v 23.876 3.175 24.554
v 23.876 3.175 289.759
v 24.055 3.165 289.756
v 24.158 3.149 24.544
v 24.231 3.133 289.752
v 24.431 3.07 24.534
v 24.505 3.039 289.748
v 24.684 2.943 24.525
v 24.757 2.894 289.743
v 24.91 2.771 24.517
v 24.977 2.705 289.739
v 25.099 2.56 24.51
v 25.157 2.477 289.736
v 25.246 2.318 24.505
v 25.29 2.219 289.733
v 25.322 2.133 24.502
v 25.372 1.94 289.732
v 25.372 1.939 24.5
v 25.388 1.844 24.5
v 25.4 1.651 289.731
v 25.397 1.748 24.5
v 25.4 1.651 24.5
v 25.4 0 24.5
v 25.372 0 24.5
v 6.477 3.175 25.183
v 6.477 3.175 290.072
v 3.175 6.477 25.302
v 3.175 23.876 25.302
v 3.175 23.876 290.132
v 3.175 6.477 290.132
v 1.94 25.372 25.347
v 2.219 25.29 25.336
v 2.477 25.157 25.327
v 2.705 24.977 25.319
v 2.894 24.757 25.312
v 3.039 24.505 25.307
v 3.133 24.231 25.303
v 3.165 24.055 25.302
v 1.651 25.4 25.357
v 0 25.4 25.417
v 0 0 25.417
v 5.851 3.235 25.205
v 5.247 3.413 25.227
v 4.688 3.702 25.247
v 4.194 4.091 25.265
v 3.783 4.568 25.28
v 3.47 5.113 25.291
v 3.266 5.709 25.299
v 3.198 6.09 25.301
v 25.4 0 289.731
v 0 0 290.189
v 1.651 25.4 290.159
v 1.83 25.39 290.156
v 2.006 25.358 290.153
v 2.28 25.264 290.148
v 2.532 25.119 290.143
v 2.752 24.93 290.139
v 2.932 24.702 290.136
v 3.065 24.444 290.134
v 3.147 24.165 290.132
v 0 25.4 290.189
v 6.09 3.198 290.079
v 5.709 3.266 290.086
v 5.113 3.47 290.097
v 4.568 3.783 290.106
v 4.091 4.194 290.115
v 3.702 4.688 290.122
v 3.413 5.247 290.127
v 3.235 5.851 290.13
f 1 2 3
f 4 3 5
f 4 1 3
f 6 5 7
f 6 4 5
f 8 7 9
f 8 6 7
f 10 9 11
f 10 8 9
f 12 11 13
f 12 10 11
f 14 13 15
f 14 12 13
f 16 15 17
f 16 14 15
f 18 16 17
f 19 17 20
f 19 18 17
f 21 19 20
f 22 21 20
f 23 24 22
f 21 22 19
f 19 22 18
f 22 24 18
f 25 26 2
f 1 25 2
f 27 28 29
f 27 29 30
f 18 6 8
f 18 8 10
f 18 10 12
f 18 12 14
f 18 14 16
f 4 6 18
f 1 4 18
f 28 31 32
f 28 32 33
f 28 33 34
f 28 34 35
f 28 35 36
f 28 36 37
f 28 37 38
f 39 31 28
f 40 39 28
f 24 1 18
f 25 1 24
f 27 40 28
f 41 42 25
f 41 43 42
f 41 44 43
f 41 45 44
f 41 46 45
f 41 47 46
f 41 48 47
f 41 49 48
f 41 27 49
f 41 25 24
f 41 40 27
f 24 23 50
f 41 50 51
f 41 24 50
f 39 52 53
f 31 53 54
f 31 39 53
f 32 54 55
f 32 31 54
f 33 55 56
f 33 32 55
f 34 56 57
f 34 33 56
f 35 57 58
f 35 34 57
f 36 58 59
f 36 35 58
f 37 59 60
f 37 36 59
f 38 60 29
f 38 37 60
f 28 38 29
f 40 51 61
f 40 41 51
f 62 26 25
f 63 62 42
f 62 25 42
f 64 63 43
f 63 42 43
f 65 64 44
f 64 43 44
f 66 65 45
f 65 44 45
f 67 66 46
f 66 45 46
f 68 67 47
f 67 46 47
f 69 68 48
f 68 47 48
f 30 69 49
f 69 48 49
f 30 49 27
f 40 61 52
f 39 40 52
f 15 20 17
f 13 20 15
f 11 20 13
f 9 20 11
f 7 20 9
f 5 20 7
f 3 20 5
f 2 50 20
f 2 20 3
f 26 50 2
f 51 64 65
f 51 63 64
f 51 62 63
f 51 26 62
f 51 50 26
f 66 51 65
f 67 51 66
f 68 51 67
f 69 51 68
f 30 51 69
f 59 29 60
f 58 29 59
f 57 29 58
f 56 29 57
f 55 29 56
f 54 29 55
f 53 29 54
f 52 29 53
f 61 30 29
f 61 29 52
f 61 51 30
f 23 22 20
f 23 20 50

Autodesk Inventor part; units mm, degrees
ref_plane "Start Plane" through (0, 0, 24.5) normal (0, 0, 1) x (1, 0, 0)
ref_plane "End Plane" through (0, 0, 290.1887) normal (0, 0, 1) x (1, 0, 0)
sketch "Sketch" plane through (0, 0, 0) normal (0, 0, 1) x (1, 0, 0)
  line L0 (25.4, 0) -> (0, 0)
  line L1 (0, 0) -> (0, 25.4)
  line L2 (0, 25.4) -> (1.651, 25.4)
  line L3 (3.175, 23.876) -> (3.175, 6.477)
  line L4 (6.477, 3.175) -> (23.876, 3.175)
  line L5 (25.4, 1.651) -> (25.4, 0)
  line L6 (0, -11.0414) -> (0, 31.5385) construction
  line L7 (-11.0414, 0) -> (31.5385, 0) construction
  arc A0 (3.175, 6.477) -> (6.477, 3.175) centre (6.477, 6.477) ccw
  arc A1 (3.175, 23.876) -> (1.651, 25.4) centre (1.651, 23.876) ccw
  arc A2 (25.4, 1.651) -> (23.876, 3.175) centre (23.876, 1.651) ccw
  line L8 (0, 40.0545) -> (0, -19.5574) construction
  line L9 (-19.5574, 0) -> (40.0545, 0) construction
  point P0 (3.175, 25.4)
  point P1 (3.175, 3.175)
  point P2 (25.4, 3.175)
  dimension "d0" = 25.4
  dimension "d1" = 25.4
  dimension "d2" = 3.175
  dimension "d3" = 3.175
  dimension "d10" = 0
  dimension "d11" = 0
  dimension "d14" = 3.302
  dimension "d15" = 1.524
extrude "Body" add sketch "Sketch" along normal up to surface (265.6887 mm away) from surface at 24.5
sketch "Sketch3" plane through (0, 0, 0) normal (0, 0, 1) x (1, 0, 0)
  line L0 (0, 0) -> (10, 0)
ref_plane "Work Plane3" through (0, 0, 0) normal (0, -1, 0) x (1, 0, 0)
ref_plane "Work Plane4" through (0, 12.7, 290.1887) normal (0.018, 0, 0.9998) x (0.9998, 0, -0.018)
split "Split1" plane through (0, 12.7, 290.1887) removes the side toward (0.018, 0, 0.9998)
ref_plane "Work Plane9" through (0.9159, 690, 25.3835) normal (-0.0361, 0, -0.9993) x (-0.9993, 0, 0.0361)
split "Split3" plane through (0.9159, 690, 25.3835) removes the side toward (-0.0361, 0, -0.9993)
sketch "Sketch4" plane through (0, 0, 0) normal (0, -1, 0) x (1, 0, 0)
  line L0 (-2, 24.5) -> (12, 24.5) projected
  line L1 (-2, 290.1887) -> (12, 290.1887) projected
  dimension "d17" = 265.6887
equation "\"d0\" = G_H"
equation "\"d1\" = G_H"
equation "\"d2\" = G_T"
equation "\"d3\" = G_T"
equation "\"d14\" = G_IR"
equation "\"d15\" = G_ER"
equation "\"d4\" = G_L"
equation "\"G_H\" = 25.4"
equation "\"G_T\" = 3.175"
equation "\"G_ER\" = 1.524"
equation "\"G_IR\" = 3.302"
equation "\"G_L\" = 265.69027"
equation "\"ex\" = 0"
equation "\"G_OFFSET_START\" = -24.50003"
equation "\"G_OFFSET_END\" = 0"
equation "\"d12\" = -G_OFFSET_START"
equation "\"d13\" = G_OFFSET_END + B_L"
equation "\"B_L\" = 290.18872"
properties part number "AISC - L 1 x 1 x 1/8 - 10.46" material "Steel, Mild"
